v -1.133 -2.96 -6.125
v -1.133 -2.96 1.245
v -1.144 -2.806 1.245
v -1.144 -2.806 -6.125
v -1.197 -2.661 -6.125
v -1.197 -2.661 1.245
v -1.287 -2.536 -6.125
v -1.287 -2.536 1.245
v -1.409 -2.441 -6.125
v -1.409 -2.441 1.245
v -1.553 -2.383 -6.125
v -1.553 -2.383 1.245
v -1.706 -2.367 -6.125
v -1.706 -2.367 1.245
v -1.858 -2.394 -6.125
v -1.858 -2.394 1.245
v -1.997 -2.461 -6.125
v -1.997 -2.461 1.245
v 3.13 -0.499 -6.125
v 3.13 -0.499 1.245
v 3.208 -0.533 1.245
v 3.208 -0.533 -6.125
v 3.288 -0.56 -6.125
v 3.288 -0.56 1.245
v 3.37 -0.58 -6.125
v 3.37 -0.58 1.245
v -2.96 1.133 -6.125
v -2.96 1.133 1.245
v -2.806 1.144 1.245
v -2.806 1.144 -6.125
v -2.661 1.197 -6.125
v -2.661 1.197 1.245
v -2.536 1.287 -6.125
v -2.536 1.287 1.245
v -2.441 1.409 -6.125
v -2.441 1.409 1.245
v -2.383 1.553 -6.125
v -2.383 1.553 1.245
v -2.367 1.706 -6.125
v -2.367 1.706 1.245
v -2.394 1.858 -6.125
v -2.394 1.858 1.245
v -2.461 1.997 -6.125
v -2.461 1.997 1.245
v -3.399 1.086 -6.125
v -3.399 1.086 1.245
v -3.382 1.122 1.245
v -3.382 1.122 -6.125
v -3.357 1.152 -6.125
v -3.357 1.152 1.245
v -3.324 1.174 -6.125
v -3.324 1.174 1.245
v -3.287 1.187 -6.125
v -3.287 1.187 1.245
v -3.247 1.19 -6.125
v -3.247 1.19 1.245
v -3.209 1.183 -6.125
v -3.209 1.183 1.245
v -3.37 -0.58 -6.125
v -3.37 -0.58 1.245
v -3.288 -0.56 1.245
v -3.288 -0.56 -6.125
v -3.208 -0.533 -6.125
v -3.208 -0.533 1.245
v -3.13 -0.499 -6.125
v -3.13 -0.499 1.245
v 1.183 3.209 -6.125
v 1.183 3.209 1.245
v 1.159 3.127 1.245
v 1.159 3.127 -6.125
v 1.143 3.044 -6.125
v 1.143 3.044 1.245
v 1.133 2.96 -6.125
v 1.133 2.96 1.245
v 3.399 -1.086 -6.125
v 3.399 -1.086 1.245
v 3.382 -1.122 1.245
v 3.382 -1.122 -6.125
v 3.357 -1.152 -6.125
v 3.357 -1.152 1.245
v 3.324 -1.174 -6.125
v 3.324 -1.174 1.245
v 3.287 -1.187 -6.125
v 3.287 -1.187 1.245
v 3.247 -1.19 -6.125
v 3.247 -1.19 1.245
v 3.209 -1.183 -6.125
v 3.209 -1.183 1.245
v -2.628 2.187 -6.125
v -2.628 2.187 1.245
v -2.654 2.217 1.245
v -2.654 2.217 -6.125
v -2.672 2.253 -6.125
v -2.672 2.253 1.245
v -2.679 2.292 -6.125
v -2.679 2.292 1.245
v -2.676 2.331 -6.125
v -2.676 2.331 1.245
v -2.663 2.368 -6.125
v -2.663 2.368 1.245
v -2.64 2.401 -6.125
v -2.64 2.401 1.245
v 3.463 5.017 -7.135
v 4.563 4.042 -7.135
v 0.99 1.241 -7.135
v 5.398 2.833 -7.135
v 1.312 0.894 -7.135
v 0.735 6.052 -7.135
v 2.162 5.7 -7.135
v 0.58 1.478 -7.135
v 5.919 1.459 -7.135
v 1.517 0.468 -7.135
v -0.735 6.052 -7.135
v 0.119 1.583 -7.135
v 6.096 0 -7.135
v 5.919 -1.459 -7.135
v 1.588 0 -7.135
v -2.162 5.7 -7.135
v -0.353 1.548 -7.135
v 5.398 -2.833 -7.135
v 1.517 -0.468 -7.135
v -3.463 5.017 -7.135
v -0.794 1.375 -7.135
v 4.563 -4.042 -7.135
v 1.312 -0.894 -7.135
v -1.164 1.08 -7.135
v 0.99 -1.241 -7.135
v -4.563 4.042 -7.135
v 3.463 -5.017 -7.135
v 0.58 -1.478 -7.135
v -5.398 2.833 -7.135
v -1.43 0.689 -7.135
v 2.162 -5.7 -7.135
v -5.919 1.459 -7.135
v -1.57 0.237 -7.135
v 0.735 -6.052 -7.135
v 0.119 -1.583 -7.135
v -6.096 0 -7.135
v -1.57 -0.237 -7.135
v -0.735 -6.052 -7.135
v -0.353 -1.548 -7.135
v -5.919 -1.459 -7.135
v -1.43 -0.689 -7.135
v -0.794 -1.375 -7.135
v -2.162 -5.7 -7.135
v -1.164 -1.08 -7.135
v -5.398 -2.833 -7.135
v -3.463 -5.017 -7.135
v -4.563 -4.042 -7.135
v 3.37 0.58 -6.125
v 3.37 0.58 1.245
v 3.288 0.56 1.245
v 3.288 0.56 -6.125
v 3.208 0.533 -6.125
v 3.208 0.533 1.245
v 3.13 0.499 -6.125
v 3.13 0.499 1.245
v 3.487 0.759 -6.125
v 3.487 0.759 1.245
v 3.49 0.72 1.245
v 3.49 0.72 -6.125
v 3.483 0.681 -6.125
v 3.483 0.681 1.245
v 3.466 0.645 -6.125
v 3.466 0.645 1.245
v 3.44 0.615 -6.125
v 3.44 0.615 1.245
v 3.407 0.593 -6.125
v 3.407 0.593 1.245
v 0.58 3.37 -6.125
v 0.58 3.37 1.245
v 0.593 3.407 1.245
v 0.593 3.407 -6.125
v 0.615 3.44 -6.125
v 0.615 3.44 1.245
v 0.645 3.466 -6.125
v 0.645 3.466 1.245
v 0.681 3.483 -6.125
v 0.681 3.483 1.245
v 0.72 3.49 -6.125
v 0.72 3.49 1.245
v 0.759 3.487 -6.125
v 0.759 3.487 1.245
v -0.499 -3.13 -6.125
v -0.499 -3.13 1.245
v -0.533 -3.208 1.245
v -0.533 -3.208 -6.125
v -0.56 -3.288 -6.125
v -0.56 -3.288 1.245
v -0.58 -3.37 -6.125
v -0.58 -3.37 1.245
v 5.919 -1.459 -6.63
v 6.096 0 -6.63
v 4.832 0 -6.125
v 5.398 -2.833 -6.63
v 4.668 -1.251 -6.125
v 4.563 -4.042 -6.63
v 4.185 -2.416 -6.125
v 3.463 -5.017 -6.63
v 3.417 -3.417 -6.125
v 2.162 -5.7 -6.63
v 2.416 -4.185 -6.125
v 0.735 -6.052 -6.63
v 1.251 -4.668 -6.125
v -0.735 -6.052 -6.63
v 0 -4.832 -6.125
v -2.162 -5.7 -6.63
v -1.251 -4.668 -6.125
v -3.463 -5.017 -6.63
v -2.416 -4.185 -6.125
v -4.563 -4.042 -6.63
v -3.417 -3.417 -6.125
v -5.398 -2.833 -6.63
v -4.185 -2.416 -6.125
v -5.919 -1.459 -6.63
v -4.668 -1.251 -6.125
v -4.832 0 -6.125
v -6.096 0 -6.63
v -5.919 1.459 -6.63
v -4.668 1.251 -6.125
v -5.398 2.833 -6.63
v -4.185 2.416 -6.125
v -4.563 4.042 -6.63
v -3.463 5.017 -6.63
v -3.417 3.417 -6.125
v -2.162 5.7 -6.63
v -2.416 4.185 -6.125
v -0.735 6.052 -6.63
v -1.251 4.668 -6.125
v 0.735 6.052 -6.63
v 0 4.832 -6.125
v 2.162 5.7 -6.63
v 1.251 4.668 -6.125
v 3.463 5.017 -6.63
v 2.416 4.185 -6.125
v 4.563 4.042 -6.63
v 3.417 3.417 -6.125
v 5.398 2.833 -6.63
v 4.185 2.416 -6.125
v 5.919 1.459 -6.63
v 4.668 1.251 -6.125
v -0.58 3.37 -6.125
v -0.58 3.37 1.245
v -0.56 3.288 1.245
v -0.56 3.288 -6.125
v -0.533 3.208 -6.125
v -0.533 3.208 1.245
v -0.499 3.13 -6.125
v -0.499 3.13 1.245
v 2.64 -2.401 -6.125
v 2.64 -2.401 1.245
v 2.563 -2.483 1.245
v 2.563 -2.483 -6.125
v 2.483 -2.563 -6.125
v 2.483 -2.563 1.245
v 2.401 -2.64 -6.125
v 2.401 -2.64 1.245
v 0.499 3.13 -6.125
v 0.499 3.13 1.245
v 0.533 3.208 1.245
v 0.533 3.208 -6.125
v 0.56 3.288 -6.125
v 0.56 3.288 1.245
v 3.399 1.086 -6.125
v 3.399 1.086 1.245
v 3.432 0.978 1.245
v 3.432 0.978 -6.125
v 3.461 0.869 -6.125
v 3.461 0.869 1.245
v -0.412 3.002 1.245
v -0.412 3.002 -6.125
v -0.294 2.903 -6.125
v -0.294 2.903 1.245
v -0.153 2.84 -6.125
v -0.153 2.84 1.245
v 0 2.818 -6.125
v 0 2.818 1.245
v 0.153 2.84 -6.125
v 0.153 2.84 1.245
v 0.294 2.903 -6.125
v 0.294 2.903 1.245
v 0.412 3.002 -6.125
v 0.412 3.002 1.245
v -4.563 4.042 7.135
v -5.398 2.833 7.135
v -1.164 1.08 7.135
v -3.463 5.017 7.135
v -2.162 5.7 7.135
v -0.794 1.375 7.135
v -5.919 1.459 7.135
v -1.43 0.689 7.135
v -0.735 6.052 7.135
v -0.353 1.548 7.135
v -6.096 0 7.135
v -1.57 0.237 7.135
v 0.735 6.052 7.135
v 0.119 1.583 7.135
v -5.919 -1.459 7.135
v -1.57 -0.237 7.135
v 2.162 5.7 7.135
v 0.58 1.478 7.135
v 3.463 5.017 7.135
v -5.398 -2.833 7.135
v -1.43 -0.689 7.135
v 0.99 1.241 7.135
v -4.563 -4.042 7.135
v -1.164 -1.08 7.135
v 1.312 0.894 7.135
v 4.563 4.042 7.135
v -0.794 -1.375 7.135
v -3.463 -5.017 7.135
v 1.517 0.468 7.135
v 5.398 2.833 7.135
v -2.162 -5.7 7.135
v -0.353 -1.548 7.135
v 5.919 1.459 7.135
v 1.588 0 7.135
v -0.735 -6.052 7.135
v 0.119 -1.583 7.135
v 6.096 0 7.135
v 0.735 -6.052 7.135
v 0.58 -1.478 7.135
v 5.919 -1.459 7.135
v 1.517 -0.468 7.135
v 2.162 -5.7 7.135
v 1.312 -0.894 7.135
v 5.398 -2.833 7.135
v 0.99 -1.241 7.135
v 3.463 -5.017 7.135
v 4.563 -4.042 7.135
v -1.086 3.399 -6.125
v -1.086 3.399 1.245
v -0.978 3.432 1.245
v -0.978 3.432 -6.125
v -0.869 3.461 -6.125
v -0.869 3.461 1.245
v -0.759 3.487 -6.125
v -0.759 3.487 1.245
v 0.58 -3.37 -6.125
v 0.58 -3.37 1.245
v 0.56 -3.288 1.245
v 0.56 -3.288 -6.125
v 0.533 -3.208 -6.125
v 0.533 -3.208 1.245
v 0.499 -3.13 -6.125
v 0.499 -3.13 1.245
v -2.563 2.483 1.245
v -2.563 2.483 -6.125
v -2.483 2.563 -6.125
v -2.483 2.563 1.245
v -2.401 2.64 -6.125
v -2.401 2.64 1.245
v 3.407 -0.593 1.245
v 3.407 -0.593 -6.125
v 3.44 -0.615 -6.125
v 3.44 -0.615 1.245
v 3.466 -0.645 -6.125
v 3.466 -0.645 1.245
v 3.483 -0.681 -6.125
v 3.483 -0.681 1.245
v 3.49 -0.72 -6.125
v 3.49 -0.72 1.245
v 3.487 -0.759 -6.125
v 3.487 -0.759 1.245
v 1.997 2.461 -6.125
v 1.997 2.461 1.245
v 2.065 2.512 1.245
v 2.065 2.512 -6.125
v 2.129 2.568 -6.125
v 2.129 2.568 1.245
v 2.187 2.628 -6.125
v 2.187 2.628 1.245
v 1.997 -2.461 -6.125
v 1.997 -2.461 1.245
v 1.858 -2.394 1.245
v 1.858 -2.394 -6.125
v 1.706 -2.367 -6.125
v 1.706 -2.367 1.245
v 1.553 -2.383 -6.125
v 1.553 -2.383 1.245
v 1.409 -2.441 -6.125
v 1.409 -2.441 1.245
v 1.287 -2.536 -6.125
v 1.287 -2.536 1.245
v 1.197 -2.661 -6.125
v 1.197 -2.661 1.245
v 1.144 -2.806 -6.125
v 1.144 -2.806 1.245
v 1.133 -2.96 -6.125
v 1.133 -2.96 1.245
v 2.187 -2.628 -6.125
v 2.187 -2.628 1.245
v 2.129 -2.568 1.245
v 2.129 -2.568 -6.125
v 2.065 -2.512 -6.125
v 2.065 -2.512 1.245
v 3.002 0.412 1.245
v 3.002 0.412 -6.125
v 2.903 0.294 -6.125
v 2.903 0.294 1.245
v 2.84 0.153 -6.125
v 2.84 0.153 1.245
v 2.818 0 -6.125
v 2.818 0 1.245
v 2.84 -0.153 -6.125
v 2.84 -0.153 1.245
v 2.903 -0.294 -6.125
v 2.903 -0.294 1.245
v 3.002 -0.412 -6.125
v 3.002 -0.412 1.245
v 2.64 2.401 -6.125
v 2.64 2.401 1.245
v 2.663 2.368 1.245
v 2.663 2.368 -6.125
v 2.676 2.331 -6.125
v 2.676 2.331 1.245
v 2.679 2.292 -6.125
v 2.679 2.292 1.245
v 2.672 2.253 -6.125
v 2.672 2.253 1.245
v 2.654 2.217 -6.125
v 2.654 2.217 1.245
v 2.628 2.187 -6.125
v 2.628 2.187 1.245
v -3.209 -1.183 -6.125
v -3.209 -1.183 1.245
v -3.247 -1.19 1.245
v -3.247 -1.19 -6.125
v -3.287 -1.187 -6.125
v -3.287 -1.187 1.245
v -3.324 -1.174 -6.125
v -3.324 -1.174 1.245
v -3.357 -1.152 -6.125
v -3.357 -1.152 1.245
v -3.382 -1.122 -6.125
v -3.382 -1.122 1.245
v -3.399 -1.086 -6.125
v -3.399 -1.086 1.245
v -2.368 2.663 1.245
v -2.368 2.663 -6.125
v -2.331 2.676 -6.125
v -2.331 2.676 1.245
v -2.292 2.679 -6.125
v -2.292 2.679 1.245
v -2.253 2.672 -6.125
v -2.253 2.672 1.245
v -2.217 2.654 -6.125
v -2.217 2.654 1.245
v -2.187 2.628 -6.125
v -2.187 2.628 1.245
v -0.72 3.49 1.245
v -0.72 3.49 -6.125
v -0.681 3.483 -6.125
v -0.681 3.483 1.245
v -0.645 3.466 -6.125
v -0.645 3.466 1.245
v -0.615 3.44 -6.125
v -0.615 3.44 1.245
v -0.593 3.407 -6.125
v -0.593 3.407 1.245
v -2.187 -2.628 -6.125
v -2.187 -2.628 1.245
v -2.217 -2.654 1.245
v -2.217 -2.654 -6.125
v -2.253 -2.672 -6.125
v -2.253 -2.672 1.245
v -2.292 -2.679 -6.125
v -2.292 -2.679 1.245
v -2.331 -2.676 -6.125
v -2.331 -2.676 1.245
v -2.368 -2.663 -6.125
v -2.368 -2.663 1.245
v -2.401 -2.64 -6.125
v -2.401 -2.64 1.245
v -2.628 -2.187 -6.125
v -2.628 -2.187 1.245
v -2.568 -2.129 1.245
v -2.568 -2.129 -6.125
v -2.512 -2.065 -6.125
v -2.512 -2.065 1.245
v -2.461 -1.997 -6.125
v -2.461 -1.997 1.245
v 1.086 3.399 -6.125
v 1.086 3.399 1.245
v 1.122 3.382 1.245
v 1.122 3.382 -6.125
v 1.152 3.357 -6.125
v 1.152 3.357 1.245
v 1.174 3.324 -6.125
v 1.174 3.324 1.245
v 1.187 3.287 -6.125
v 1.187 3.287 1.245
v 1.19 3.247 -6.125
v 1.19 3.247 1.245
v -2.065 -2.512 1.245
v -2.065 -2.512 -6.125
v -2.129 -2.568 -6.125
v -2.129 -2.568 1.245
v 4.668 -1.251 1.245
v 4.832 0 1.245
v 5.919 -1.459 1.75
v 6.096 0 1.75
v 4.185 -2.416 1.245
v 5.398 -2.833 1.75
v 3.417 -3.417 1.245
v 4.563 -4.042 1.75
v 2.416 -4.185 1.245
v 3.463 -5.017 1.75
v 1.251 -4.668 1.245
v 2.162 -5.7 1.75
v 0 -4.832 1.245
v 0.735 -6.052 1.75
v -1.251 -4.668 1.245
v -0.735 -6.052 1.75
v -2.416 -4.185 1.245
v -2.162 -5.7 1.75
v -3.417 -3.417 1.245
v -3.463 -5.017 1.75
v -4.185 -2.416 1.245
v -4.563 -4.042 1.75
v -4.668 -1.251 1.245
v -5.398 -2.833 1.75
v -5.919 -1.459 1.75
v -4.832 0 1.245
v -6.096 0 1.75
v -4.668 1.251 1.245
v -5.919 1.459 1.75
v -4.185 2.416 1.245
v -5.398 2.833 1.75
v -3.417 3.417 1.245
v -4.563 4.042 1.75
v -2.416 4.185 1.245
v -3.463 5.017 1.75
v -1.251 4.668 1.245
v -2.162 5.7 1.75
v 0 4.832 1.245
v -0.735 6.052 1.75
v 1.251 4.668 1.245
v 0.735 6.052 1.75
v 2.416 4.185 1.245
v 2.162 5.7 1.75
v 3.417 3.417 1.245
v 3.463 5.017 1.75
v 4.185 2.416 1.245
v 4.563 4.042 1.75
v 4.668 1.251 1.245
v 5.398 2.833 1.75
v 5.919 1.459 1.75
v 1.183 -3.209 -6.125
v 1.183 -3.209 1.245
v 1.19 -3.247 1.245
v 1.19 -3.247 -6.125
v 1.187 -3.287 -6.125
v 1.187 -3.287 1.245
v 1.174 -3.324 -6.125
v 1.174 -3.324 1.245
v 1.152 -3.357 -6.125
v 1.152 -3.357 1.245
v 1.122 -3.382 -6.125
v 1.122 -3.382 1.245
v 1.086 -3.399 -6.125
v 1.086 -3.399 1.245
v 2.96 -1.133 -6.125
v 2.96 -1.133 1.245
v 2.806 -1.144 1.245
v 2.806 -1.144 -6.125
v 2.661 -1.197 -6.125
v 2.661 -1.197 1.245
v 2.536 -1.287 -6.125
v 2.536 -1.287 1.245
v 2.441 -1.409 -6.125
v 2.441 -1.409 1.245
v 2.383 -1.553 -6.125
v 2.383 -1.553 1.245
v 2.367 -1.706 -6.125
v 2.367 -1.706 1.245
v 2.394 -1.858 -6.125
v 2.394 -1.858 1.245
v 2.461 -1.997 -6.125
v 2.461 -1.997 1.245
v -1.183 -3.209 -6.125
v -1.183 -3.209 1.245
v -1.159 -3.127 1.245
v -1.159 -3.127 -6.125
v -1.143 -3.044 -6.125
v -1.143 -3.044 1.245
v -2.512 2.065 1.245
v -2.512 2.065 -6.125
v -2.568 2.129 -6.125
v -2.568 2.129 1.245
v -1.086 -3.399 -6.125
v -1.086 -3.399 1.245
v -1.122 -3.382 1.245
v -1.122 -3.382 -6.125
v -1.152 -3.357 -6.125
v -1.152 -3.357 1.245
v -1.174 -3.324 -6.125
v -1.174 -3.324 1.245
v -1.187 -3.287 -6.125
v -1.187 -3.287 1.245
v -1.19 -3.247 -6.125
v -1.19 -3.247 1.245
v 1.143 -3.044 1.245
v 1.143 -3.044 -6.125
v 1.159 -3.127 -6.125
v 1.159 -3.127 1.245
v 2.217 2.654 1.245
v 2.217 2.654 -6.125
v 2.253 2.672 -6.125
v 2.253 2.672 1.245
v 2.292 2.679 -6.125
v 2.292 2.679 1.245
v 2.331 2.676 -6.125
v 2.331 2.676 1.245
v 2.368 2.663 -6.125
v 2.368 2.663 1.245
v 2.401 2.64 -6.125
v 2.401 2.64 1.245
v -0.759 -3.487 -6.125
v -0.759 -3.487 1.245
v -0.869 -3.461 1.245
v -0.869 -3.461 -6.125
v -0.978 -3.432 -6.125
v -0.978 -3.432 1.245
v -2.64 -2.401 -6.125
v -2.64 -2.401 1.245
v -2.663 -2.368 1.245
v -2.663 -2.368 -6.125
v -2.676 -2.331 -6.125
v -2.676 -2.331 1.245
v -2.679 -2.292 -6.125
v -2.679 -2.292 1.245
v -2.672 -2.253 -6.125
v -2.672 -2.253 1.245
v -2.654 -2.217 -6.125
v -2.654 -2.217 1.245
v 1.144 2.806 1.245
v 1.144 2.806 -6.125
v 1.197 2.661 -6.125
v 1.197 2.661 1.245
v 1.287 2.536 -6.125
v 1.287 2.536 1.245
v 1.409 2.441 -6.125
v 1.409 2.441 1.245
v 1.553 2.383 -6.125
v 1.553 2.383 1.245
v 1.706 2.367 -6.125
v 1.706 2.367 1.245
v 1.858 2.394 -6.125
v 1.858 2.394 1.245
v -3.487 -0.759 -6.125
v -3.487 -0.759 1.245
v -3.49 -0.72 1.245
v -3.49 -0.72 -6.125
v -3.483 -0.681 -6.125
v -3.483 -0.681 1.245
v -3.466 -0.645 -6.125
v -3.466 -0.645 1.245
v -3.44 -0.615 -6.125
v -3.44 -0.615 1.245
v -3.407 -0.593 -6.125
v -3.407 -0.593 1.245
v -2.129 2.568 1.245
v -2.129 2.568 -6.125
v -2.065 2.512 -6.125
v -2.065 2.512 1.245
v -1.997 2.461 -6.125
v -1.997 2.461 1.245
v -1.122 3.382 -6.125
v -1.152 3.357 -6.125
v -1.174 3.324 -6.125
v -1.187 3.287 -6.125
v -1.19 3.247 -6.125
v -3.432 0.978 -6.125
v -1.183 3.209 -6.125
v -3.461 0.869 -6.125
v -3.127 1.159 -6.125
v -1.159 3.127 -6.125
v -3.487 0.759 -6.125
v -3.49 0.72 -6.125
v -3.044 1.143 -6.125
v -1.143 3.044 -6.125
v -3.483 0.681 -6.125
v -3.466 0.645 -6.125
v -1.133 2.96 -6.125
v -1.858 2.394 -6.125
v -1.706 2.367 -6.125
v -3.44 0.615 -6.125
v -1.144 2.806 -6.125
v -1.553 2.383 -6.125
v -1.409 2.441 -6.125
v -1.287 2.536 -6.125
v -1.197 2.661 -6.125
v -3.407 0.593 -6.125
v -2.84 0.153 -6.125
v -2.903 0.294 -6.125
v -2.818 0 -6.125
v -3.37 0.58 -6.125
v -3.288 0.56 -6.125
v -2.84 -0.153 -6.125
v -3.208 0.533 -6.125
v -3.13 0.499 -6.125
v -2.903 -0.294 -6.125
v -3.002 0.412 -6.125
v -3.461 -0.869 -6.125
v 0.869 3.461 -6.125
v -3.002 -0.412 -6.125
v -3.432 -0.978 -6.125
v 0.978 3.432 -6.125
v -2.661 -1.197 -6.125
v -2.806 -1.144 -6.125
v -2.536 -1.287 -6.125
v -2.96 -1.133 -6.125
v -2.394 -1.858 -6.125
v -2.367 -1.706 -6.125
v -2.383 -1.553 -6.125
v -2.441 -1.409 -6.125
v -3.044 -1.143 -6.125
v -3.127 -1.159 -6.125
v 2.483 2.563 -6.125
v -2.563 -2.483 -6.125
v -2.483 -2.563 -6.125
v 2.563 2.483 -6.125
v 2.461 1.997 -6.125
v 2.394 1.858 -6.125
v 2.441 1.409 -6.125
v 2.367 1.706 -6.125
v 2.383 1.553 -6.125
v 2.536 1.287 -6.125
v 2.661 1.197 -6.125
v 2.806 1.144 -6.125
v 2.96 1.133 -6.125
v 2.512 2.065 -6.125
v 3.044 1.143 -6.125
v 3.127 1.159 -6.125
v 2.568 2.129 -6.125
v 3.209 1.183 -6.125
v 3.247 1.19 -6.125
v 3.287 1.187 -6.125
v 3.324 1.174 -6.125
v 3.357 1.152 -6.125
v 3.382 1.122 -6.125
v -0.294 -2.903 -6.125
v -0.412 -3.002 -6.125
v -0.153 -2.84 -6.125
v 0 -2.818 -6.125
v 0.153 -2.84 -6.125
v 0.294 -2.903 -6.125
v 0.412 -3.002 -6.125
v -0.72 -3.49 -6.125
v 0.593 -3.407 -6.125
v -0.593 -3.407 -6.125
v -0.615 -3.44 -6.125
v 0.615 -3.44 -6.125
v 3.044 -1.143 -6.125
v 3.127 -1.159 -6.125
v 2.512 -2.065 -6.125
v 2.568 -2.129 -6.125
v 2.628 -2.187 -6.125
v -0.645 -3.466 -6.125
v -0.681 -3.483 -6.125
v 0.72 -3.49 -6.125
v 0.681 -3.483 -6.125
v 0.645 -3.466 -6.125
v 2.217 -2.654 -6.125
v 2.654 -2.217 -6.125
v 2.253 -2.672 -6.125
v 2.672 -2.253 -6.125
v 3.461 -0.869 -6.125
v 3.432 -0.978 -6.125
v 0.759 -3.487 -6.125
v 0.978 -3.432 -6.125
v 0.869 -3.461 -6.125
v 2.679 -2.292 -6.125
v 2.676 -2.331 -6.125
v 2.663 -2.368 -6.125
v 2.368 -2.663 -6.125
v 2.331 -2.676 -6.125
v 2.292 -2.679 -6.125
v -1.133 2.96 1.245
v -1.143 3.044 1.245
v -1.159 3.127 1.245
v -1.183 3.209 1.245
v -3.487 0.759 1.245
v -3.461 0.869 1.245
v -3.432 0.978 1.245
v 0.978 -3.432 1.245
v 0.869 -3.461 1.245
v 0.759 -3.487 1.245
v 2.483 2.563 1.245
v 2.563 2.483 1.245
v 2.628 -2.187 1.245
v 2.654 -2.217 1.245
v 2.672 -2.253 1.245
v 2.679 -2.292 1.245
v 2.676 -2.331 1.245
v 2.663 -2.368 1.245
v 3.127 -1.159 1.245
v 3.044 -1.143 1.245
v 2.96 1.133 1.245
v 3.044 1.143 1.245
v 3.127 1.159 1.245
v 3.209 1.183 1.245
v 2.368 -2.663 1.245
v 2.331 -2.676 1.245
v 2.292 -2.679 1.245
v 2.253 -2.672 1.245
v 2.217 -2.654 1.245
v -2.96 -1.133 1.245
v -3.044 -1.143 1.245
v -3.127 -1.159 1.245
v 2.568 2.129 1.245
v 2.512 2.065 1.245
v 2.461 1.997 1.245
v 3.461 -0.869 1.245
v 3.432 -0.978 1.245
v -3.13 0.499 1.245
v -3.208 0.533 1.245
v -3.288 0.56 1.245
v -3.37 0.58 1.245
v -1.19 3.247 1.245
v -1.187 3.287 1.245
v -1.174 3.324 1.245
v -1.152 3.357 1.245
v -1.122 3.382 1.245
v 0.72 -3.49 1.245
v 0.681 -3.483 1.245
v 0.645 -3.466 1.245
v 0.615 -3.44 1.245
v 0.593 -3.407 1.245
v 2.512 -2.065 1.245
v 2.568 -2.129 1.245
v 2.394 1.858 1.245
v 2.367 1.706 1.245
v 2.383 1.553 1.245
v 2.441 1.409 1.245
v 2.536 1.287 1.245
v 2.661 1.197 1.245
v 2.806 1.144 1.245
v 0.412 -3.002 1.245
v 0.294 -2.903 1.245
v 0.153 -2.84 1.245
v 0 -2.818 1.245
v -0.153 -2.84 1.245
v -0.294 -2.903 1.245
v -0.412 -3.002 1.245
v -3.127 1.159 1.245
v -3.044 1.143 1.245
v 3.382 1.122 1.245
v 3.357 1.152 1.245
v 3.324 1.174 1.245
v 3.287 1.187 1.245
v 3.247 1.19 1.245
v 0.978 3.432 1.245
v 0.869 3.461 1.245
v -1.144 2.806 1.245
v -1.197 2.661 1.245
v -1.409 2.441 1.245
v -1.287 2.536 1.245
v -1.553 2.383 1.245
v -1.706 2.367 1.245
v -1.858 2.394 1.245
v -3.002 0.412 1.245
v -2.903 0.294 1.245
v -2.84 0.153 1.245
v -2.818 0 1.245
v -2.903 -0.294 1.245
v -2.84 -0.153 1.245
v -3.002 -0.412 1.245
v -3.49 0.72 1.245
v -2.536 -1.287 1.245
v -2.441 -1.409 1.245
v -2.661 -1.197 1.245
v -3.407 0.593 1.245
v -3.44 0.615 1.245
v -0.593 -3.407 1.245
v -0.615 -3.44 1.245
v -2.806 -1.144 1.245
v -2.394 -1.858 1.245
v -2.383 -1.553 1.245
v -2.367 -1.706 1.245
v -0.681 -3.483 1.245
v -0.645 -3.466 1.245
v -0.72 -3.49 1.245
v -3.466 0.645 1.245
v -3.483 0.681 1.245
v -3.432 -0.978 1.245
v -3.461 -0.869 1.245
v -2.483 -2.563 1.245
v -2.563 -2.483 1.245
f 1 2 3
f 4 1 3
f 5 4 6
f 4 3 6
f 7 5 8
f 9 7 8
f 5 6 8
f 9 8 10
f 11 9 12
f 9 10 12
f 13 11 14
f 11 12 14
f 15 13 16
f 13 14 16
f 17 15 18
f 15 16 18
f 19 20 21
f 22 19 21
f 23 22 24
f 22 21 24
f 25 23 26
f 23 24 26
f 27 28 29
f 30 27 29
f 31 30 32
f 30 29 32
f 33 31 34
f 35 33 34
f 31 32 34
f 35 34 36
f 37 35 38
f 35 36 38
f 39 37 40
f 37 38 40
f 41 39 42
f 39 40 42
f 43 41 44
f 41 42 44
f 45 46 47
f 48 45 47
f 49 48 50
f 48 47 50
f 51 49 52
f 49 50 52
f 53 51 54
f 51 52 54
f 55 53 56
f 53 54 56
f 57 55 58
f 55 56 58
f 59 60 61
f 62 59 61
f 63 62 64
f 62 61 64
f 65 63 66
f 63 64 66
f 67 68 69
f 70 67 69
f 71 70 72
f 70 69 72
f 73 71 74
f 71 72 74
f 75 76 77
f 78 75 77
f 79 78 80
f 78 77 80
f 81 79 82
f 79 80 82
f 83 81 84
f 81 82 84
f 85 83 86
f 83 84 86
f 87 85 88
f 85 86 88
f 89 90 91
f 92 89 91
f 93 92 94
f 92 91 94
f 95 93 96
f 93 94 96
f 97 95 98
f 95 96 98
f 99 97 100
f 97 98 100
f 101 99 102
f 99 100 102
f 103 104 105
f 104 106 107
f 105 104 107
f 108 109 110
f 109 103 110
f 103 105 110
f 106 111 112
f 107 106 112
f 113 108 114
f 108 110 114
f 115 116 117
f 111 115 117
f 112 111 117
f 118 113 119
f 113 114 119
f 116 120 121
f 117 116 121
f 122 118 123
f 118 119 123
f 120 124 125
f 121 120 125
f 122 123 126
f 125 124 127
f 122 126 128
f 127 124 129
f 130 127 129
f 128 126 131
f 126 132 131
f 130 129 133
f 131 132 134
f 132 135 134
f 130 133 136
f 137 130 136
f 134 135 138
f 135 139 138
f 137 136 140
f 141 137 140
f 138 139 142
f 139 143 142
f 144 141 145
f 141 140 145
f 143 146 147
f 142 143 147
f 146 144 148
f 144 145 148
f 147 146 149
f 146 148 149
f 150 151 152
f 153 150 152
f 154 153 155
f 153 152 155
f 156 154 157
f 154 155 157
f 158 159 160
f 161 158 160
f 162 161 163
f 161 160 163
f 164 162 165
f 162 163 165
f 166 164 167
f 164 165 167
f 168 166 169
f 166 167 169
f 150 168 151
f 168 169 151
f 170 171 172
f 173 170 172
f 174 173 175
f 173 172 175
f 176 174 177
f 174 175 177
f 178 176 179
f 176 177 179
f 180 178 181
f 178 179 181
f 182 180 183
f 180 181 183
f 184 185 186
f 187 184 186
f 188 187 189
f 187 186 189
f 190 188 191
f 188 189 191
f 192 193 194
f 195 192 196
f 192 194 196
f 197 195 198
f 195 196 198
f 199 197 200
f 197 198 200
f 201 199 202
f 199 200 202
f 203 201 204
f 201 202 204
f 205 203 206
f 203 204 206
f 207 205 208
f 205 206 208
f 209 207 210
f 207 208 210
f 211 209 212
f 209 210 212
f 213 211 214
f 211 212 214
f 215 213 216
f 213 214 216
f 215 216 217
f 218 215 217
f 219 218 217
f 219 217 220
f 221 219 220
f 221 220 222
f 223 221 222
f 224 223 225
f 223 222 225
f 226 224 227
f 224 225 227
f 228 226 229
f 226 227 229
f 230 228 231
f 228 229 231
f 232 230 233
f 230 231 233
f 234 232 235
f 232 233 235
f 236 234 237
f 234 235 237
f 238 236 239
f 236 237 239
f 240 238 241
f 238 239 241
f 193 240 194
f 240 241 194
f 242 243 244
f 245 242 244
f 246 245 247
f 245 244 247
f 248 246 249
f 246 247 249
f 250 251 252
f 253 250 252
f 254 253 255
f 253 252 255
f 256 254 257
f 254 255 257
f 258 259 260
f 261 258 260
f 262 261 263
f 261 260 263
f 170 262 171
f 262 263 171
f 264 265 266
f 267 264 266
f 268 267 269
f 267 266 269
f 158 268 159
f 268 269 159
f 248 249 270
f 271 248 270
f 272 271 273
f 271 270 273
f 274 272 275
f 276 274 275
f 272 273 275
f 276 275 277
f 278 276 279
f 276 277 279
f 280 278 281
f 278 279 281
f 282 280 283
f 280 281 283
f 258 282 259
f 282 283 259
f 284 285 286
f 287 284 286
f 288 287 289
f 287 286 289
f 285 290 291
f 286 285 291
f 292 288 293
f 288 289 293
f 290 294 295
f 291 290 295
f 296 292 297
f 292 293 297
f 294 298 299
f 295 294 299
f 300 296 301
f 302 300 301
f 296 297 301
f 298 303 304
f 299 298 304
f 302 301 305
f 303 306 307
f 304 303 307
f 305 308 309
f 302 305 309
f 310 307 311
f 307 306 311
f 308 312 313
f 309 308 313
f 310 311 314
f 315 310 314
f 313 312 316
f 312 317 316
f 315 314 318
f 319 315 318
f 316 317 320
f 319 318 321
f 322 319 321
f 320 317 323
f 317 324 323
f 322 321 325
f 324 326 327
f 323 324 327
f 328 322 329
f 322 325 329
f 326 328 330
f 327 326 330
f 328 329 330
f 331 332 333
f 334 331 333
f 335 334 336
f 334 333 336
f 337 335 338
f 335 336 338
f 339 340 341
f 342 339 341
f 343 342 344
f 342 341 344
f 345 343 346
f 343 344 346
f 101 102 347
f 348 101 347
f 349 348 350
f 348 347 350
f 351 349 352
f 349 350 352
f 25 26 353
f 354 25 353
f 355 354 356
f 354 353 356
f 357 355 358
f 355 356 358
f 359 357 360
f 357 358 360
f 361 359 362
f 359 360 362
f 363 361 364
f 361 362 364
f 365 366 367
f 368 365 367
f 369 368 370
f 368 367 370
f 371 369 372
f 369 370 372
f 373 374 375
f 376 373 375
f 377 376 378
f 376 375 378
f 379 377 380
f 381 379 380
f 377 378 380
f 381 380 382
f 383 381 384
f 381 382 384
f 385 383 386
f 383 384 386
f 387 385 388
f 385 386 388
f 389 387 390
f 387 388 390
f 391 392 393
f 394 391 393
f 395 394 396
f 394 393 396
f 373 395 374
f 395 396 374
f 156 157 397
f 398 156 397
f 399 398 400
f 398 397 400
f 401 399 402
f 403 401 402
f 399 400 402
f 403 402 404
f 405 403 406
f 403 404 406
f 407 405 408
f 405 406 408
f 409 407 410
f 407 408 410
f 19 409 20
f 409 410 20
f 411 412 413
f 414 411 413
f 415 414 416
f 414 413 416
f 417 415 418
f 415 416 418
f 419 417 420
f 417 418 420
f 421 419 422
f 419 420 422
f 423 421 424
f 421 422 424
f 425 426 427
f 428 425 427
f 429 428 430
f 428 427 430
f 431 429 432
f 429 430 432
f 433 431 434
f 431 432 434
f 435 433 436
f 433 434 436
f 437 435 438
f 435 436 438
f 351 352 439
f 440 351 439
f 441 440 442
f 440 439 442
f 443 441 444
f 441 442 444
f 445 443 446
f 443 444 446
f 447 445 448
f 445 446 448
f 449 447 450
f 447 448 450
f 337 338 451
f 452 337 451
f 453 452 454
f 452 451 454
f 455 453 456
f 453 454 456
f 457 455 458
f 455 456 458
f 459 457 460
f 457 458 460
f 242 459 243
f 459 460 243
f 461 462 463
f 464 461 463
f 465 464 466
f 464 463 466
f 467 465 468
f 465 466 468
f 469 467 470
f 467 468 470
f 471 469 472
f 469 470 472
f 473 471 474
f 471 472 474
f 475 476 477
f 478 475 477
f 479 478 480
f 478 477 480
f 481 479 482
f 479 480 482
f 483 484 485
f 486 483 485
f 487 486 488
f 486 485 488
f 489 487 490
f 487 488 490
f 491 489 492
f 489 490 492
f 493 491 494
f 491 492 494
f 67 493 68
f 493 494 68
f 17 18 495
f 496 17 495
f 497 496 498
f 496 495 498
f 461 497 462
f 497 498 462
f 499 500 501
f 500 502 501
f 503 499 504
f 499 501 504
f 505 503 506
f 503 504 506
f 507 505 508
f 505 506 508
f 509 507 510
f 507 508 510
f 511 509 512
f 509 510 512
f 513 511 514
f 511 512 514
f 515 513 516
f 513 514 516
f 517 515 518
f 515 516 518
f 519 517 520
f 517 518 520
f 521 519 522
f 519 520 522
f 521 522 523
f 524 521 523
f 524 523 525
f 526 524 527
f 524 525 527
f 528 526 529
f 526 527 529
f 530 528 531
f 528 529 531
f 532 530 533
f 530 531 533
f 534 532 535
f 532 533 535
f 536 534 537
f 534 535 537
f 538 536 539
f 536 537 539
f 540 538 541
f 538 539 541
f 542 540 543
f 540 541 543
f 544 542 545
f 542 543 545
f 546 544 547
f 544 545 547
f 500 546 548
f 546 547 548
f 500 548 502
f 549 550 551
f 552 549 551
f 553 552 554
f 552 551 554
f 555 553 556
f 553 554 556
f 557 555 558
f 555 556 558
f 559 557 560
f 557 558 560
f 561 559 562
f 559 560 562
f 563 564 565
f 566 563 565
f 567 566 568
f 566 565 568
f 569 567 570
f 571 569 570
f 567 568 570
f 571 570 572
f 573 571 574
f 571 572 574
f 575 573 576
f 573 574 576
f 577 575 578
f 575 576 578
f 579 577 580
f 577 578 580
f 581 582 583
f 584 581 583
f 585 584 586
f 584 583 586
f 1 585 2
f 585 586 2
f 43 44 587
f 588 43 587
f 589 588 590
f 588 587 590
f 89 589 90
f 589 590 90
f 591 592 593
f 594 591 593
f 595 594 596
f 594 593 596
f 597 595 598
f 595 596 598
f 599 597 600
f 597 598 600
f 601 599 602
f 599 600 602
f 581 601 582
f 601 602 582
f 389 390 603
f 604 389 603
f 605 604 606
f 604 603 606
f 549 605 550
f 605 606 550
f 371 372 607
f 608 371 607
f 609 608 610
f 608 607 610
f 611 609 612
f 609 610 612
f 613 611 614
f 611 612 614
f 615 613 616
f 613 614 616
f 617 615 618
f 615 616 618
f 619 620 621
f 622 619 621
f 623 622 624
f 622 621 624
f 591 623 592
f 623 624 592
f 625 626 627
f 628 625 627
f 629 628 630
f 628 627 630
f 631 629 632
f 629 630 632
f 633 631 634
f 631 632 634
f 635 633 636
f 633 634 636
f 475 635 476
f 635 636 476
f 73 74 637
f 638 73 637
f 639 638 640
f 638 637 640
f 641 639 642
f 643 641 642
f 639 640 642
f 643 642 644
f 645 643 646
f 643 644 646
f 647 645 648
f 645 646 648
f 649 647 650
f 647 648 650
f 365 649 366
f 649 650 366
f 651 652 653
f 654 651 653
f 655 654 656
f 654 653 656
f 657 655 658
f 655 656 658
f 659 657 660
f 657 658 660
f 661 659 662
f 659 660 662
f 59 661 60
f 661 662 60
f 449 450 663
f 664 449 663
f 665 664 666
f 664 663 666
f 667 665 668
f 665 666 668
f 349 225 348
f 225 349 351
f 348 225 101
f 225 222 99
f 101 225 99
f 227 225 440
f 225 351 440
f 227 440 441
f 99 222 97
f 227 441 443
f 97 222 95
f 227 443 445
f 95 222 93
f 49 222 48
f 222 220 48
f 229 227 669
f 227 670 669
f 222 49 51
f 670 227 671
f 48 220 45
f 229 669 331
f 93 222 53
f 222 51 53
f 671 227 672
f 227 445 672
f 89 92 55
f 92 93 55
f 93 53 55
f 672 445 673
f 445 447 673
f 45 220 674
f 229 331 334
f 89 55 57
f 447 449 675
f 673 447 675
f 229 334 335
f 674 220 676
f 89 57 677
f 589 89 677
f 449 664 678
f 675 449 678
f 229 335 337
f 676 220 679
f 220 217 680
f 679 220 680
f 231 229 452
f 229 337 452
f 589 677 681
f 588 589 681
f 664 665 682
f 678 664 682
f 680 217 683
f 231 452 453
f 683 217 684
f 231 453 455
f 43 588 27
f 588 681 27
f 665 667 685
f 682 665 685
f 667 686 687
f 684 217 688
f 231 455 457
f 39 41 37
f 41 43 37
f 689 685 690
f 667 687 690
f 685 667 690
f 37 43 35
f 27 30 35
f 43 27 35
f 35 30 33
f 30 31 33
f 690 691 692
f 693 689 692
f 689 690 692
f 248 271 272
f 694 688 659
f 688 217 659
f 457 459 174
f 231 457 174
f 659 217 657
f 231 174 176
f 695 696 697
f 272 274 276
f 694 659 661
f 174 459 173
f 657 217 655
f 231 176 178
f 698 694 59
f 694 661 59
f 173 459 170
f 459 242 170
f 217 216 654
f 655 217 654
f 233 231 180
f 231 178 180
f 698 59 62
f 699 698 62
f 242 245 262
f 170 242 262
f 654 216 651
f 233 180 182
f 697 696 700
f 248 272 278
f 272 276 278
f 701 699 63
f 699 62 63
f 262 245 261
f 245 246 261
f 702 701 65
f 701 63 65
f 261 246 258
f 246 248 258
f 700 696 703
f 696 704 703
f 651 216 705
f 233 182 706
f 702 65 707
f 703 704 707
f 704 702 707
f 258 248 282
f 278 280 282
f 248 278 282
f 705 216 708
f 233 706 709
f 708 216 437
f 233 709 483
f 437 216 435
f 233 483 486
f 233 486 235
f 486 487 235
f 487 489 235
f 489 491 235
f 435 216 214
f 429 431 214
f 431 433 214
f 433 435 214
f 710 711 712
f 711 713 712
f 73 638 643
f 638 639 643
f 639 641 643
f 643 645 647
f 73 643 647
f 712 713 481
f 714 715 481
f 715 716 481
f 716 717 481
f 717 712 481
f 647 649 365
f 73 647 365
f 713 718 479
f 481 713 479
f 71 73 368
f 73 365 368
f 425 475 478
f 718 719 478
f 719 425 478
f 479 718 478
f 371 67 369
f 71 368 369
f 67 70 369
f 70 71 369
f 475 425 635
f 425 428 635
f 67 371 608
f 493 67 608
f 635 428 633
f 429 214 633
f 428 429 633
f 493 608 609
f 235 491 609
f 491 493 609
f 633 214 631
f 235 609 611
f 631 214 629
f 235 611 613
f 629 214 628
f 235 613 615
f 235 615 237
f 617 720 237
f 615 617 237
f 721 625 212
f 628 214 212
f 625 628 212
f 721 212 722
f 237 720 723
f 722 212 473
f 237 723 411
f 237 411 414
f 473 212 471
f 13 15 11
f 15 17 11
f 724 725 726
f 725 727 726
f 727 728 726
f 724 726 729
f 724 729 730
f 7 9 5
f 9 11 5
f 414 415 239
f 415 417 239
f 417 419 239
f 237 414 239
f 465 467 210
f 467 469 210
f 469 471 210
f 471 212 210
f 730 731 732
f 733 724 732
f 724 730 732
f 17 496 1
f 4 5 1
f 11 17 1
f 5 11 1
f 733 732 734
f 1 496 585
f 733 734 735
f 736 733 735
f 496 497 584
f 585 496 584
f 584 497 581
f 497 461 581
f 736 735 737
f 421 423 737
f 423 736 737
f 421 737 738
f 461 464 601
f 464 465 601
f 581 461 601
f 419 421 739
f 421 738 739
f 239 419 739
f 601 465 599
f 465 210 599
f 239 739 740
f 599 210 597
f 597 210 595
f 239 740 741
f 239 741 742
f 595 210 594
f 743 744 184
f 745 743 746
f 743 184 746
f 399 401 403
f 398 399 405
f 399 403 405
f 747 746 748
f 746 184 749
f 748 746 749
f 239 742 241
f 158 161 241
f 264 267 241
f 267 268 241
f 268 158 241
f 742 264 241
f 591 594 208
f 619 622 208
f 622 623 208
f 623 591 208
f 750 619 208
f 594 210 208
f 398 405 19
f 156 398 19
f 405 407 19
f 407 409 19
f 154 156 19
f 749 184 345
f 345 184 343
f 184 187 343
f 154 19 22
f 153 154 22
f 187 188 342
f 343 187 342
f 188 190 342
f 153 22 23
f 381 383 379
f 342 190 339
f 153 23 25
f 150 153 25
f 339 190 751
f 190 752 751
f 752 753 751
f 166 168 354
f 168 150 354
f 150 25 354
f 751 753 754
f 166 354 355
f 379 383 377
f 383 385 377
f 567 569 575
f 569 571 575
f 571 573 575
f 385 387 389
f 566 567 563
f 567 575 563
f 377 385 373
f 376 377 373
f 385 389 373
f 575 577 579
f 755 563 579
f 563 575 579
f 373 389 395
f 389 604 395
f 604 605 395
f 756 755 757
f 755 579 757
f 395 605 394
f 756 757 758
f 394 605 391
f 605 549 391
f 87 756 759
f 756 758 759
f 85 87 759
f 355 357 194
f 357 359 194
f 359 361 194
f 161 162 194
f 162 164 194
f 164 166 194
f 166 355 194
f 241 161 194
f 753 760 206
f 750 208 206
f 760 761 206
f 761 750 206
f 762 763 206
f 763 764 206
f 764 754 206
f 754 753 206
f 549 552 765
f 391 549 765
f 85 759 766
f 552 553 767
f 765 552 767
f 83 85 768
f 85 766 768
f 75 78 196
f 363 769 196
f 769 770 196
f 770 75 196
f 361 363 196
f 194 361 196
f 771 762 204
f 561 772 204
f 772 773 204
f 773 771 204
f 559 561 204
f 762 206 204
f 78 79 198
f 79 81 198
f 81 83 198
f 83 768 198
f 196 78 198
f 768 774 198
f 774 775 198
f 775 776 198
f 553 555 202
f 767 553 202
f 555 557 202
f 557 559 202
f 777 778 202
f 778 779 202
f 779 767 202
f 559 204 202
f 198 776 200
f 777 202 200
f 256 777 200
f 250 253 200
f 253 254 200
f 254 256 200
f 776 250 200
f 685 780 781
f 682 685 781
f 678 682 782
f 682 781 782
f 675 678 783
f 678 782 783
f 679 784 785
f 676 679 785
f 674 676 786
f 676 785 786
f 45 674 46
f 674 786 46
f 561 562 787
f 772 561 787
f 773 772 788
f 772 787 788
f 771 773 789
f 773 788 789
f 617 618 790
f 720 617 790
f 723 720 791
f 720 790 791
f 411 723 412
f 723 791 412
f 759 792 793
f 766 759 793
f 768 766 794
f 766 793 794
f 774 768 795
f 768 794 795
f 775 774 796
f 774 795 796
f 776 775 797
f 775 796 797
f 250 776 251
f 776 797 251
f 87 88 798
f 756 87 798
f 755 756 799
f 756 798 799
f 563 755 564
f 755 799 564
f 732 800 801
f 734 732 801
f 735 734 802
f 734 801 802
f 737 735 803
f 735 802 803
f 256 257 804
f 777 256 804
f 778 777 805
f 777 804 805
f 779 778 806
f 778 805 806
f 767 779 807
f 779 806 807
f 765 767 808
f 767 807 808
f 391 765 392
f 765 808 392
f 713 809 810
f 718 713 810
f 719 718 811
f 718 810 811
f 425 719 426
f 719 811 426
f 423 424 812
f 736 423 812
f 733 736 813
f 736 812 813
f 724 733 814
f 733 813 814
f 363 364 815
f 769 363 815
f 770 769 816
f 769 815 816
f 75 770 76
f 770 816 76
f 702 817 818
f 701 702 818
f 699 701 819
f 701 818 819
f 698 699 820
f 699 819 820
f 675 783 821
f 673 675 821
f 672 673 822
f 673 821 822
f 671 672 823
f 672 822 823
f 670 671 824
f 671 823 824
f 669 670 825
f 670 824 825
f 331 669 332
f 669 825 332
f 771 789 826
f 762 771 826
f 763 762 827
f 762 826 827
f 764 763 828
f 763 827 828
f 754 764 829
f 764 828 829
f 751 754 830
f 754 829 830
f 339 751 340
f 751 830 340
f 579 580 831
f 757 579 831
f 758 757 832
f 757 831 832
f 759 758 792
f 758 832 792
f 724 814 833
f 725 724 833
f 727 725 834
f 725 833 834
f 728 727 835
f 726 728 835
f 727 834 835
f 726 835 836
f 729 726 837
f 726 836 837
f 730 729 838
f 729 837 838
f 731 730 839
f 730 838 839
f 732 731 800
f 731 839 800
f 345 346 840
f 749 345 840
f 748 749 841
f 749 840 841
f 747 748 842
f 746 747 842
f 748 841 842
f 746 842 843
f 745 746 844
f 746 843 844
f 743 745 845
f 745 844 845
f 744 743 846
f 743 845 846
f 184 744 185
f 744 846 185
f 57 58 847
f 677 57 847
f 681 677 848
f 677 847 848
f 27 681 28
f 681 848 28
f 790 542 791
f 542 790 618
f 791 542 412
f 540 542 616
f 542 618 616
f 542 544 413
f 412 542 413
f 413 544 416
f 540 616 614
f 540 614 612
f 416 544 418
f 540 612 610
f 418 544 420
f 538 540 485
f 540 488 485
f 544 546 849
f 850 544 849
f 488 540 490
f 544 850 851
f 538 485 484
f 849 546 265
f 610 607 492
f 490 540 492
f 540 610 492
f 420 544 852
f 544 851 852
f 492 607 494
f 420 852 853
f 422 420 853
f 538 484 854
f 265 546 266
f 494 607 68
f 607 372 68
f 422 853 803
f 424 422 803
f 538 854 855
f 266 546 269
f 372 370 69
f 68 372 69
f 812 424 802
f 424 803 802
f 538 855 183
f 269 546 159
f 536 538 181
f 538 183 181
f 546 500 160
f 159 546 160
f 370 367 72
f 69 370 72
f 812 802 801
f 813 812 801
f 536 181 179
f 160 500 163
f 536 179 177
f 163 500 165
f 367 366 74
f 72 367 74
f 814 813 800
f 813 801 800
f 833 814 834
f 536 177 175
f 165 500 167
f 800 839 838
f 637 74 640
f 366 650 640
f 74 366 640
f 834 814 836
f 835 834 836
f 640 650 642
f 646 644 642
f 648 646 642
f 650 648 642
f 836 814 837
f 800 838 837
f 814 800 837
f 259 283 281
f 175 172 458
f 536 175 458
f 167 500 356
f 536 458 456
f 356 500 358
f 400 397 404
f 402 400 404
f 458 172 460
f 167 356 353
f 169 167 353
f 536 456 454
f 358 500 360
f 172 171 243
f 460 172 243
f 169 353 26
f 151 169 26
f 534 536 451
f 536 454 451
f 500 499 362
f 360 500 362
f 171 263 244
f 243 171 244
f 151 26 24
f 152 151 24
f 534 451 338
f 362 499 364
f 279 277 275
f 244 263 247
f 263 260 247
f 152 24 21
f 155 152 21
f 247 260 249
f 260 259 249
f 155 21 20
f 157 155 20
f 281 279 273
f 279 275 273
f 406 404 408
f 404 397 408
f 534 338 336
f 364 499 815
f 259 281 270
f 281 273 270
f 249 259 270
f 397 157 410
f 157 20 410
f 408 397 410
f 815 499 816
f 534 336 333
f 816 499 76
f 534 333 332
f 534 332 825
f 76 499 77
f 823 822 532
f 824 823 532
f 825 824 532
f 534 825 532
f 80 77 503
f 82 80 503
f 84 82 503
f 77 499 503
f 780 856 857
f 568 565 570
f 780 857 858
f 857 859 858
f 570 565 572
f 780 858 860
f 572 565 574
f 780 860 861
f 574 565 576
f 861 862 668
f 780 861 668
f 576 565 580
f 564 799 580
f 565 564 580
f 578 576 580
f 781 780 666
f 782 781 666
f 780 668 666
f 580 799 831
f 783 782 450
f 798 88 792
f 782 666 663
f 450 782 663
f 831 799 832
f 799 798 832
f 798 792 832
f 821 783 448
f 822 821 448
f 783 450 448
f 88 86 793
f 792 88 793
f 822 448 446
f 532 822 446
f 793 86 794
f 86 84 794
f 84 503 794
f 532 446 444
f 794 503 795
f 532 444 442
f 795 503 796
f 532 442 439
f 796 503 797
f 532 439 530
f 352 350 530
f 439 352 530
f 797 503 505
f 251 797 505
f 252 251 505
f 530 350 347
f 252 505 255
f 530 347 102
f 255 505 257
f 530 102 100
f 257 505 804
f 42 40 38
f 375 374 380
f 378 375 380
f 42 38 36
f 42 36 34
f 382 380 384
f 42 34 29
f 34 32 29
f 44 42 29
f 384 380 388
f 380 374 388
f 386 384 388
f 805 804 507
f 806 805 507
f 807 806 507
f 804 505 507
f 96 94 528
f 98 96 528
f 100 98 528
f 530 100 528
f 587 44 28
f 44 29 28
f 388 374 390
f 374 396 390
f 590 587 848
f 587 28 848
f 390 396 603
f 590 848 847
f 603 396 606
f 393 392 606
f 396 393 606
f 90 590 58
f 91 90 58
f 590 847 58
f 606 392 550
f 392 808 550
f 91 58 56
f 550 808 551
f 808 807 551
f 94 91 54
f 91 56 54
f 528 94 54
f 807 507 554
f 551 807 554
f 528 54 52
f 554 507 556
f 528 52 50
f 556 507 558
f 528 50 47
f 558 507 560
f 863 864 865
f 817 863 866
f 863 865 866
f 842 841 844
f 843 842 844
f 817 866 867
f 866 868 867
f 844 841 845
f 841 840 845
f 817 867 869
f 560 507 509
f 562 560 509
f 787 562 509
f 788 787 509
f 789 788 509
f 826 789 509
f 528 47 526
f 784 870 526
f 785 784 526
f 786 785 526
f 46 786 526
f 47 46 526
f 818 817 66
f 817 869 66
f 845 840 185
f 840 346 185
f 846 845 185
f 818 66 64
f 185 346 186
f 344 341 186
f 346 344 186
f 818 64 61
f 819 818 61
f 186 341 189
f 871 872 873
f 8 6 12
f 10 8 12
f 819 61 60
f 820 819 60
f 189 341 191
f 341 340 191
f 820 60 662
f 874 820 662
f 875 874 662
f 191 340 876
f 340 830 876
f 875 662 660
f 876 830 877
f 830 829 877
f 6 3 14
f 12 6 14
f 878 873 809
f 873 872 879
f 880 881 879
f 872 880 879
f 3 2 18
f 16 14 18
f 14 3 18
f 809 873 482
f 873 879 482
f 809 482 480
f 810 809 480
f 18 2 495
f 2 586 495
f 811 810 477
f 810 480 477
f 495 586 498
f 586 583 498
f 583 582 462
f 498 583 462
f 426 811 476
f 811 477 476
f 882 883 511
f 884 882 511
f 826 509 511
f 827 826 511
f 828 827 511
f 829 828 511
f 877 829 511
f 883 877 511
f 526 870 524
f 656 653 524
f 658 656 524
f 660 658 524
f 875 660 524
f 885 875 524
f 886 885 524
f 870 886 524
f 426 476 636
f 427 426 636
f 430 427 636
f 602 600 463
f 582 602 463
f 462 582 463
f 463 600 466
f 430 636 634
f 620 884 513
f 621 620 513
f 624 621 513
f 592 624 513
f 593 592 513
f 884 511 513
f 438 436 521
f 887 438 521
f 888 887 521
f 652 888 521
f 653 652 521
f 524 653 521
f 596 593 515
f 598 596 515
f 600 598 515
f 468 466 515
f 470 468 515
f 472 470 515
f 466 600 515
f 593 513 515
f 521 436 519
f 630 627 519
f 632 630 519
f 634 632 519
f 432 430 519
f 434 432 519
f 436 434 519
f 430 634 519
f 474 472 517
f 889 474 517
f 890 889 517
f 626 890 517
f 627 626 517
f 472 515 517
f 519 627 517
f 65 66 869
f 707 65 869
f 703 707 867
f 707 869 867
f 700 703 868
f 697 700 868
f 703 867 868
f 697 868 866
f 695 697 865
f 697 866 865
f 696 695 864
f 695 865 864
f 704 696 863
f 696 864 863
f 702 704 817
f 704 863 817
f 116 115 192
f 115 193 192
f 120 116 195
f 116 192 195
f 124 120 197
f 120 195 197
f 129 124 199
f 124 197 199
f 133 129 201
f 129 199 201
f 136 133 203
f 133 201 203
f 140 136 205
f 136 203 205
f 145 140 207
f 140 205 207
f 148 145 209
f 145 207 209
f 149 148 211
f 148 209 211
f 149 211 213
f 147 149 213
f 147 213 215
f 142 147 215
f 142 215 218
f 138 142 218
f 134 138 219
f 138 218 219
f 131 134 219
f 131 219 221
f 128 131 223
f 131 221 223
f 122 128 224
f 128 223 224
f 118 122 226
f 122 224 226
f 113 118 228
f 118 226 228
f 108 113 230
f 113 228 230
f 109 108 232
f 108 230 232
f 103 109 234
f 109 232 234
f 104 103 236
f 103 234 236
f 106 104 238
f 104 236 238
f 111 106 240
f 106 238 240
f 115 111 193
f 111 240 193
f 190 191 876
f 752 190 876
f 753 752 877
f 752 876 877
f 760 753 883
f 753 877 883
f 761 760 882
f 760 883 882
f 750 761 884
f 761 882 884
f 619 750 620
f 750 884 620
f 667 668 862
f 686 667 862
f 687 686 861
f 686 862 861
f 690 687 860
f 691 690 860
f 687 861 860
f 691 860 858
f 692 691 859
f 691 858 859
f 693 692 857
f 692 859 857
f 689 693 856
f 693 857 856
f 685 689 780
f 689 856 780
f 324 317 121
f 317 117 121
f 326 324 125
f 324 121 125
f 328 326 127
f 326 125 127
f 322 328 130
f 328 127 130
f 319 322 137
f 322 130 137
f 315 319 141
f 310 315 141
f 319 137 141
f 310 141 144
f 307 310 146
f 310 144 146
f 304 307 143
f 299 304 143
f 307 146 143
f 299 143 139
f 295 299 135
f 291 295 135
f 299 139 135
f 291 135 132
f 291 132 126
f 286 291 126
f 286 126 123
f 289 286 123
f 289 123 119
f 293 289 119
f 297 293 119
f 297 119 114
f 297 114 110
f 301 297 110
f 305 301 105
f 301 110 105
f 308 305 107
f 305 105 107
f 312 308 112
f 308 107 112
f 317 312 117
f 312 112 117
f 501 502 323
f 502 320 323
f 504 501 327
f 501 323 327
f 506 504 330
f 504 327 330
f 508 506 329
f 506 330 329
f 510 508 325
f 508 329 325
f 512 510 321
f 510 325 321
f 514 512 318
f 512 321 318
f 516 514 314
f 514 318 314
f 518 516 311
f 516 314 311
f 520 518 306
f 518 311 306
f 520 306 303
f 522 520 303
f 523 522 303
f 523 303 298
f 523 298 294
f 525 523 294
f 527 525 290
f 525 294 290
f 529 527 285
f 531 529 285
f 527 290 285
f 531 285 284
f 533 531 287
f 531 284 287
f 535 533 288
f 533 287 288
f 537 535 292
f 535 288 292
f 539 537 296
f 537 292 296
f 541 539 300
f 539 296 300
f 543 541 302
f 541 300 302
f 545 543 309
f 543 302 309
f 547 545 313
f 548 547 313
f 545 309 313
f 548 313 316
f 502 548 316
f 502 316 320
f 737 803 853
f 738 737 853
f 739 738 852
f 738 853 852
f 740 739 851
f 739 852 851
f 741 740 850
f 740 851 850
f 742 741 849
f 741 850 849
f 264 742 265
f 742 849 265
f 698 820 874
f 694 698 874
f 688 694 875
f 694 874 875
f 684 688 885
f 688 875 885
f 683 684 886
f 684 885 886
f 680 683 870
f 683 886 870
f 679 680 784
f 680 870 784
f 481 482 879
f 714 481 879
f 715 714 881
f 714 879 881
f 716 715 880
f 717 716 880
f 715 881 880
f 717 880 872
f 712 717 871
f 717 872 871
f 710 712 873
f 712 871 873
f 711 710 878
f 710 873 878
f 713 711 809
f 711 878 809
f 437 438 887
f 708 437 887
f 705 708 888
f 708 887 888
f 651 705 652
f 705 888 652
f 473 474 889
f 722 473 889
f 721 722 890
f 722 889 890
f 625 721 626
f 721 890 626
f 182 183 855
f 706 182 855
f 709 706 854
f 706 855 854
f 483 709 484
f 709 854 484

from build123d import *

# Parameters (mm, degrees)
CUT_EXTRUDE1_START = 1.245
CUT_EXTRUDE1_DEPTH = 7.37
CIRPATTERN1_COUNT  = 12


with BuildPart() as part:
    # Sketch2 → Revolve1 (revolve)
    with BuildSketch(Plane(origin=(0, 0, 0), x_dir=(0, 0, -1), z_dir=(1, 0, 0)), mode=Mode.PRIVATE) as revolve1_sk:
        Polygon((-7.135, 1.5875), (7.135, 1.5875), (7.135, 6.096), (6.63, 6.096), (6.125, 4.83225), (6.125, 3.5685), (-1.245, 3.5685), (-1.245, 4.83225), (-1.75, 6.096), (-7.135, 6.096), align=None)
    revolve(revolve1_sk.sketch.rotate(Axis((0, 0, 7.135), (0, 0, -1)), 90), axis=Axis((0, 0, 7.135), (0, 0, -1)))

    # Sketch3 → Cut-Extrude1 (cut)
    with BuildSketch(Plane.XY.offset(CUT_EXTRUDE1_START)):
        with BuildLine():
            Line((3.566654882, 6.096), (-3.566654882, 6.096))
            Line((-3.566654882, 6.096), (-1.802078902, 3.080049331))
            ThreePointArc((-1.802078902, 3.080049331), (-1.296607682, 3.324605355), (-0.759031417, 3.486841487))
            ThreePointArc((-0.759031417, 3.486841487), (-0.645131247, 3.465879975), (-0.580109509, 3.370042573))
            ThreePointArc((-0.580109509, 3.370042573), (-0.547109503, 3.247589437), (-0.498876404, 3.130297753))
            ThreePointArc((-0.498876404, 3.130297753), (0, 2.8185), (0.498876404, 3.130297753))
            ThreePointArc((0.498876404, 3.130297753), (0.547109503, 3.247589437), (0.580109509, 3.370042573))
            ThreePointArc((0.580109509, 3.370042573), (0.645131247, 3.465879975), (0.759031417, 3.486841487))
            ThreePointArc((0.759031417, 3.486841487), (1.296607682, 3.324605355), (1.802078902, 3.080049331))
            Line((1.802078902, 3.080049331), (3.566654882, 6.096))
        make_face()
    cut_extrude1 = extrude(amount=-CUT_EXTRUDE1_DEPTH, mode=Mode.SUBTRACT)

    # CirPattern1: Cut-Extrude1 ×12 about axis
    cirpattern1_axis = Axis((0, 0, 0), (0, 0, 1))
    for i in range(1, CIRPATTERN1_COUNT):
        add(cut_extrude1.rotate(cirpattern1_axis, i * 360 / CIRPATTERN1_COUNT), mode=Mode.SUBTRACT)


solid = part.part
